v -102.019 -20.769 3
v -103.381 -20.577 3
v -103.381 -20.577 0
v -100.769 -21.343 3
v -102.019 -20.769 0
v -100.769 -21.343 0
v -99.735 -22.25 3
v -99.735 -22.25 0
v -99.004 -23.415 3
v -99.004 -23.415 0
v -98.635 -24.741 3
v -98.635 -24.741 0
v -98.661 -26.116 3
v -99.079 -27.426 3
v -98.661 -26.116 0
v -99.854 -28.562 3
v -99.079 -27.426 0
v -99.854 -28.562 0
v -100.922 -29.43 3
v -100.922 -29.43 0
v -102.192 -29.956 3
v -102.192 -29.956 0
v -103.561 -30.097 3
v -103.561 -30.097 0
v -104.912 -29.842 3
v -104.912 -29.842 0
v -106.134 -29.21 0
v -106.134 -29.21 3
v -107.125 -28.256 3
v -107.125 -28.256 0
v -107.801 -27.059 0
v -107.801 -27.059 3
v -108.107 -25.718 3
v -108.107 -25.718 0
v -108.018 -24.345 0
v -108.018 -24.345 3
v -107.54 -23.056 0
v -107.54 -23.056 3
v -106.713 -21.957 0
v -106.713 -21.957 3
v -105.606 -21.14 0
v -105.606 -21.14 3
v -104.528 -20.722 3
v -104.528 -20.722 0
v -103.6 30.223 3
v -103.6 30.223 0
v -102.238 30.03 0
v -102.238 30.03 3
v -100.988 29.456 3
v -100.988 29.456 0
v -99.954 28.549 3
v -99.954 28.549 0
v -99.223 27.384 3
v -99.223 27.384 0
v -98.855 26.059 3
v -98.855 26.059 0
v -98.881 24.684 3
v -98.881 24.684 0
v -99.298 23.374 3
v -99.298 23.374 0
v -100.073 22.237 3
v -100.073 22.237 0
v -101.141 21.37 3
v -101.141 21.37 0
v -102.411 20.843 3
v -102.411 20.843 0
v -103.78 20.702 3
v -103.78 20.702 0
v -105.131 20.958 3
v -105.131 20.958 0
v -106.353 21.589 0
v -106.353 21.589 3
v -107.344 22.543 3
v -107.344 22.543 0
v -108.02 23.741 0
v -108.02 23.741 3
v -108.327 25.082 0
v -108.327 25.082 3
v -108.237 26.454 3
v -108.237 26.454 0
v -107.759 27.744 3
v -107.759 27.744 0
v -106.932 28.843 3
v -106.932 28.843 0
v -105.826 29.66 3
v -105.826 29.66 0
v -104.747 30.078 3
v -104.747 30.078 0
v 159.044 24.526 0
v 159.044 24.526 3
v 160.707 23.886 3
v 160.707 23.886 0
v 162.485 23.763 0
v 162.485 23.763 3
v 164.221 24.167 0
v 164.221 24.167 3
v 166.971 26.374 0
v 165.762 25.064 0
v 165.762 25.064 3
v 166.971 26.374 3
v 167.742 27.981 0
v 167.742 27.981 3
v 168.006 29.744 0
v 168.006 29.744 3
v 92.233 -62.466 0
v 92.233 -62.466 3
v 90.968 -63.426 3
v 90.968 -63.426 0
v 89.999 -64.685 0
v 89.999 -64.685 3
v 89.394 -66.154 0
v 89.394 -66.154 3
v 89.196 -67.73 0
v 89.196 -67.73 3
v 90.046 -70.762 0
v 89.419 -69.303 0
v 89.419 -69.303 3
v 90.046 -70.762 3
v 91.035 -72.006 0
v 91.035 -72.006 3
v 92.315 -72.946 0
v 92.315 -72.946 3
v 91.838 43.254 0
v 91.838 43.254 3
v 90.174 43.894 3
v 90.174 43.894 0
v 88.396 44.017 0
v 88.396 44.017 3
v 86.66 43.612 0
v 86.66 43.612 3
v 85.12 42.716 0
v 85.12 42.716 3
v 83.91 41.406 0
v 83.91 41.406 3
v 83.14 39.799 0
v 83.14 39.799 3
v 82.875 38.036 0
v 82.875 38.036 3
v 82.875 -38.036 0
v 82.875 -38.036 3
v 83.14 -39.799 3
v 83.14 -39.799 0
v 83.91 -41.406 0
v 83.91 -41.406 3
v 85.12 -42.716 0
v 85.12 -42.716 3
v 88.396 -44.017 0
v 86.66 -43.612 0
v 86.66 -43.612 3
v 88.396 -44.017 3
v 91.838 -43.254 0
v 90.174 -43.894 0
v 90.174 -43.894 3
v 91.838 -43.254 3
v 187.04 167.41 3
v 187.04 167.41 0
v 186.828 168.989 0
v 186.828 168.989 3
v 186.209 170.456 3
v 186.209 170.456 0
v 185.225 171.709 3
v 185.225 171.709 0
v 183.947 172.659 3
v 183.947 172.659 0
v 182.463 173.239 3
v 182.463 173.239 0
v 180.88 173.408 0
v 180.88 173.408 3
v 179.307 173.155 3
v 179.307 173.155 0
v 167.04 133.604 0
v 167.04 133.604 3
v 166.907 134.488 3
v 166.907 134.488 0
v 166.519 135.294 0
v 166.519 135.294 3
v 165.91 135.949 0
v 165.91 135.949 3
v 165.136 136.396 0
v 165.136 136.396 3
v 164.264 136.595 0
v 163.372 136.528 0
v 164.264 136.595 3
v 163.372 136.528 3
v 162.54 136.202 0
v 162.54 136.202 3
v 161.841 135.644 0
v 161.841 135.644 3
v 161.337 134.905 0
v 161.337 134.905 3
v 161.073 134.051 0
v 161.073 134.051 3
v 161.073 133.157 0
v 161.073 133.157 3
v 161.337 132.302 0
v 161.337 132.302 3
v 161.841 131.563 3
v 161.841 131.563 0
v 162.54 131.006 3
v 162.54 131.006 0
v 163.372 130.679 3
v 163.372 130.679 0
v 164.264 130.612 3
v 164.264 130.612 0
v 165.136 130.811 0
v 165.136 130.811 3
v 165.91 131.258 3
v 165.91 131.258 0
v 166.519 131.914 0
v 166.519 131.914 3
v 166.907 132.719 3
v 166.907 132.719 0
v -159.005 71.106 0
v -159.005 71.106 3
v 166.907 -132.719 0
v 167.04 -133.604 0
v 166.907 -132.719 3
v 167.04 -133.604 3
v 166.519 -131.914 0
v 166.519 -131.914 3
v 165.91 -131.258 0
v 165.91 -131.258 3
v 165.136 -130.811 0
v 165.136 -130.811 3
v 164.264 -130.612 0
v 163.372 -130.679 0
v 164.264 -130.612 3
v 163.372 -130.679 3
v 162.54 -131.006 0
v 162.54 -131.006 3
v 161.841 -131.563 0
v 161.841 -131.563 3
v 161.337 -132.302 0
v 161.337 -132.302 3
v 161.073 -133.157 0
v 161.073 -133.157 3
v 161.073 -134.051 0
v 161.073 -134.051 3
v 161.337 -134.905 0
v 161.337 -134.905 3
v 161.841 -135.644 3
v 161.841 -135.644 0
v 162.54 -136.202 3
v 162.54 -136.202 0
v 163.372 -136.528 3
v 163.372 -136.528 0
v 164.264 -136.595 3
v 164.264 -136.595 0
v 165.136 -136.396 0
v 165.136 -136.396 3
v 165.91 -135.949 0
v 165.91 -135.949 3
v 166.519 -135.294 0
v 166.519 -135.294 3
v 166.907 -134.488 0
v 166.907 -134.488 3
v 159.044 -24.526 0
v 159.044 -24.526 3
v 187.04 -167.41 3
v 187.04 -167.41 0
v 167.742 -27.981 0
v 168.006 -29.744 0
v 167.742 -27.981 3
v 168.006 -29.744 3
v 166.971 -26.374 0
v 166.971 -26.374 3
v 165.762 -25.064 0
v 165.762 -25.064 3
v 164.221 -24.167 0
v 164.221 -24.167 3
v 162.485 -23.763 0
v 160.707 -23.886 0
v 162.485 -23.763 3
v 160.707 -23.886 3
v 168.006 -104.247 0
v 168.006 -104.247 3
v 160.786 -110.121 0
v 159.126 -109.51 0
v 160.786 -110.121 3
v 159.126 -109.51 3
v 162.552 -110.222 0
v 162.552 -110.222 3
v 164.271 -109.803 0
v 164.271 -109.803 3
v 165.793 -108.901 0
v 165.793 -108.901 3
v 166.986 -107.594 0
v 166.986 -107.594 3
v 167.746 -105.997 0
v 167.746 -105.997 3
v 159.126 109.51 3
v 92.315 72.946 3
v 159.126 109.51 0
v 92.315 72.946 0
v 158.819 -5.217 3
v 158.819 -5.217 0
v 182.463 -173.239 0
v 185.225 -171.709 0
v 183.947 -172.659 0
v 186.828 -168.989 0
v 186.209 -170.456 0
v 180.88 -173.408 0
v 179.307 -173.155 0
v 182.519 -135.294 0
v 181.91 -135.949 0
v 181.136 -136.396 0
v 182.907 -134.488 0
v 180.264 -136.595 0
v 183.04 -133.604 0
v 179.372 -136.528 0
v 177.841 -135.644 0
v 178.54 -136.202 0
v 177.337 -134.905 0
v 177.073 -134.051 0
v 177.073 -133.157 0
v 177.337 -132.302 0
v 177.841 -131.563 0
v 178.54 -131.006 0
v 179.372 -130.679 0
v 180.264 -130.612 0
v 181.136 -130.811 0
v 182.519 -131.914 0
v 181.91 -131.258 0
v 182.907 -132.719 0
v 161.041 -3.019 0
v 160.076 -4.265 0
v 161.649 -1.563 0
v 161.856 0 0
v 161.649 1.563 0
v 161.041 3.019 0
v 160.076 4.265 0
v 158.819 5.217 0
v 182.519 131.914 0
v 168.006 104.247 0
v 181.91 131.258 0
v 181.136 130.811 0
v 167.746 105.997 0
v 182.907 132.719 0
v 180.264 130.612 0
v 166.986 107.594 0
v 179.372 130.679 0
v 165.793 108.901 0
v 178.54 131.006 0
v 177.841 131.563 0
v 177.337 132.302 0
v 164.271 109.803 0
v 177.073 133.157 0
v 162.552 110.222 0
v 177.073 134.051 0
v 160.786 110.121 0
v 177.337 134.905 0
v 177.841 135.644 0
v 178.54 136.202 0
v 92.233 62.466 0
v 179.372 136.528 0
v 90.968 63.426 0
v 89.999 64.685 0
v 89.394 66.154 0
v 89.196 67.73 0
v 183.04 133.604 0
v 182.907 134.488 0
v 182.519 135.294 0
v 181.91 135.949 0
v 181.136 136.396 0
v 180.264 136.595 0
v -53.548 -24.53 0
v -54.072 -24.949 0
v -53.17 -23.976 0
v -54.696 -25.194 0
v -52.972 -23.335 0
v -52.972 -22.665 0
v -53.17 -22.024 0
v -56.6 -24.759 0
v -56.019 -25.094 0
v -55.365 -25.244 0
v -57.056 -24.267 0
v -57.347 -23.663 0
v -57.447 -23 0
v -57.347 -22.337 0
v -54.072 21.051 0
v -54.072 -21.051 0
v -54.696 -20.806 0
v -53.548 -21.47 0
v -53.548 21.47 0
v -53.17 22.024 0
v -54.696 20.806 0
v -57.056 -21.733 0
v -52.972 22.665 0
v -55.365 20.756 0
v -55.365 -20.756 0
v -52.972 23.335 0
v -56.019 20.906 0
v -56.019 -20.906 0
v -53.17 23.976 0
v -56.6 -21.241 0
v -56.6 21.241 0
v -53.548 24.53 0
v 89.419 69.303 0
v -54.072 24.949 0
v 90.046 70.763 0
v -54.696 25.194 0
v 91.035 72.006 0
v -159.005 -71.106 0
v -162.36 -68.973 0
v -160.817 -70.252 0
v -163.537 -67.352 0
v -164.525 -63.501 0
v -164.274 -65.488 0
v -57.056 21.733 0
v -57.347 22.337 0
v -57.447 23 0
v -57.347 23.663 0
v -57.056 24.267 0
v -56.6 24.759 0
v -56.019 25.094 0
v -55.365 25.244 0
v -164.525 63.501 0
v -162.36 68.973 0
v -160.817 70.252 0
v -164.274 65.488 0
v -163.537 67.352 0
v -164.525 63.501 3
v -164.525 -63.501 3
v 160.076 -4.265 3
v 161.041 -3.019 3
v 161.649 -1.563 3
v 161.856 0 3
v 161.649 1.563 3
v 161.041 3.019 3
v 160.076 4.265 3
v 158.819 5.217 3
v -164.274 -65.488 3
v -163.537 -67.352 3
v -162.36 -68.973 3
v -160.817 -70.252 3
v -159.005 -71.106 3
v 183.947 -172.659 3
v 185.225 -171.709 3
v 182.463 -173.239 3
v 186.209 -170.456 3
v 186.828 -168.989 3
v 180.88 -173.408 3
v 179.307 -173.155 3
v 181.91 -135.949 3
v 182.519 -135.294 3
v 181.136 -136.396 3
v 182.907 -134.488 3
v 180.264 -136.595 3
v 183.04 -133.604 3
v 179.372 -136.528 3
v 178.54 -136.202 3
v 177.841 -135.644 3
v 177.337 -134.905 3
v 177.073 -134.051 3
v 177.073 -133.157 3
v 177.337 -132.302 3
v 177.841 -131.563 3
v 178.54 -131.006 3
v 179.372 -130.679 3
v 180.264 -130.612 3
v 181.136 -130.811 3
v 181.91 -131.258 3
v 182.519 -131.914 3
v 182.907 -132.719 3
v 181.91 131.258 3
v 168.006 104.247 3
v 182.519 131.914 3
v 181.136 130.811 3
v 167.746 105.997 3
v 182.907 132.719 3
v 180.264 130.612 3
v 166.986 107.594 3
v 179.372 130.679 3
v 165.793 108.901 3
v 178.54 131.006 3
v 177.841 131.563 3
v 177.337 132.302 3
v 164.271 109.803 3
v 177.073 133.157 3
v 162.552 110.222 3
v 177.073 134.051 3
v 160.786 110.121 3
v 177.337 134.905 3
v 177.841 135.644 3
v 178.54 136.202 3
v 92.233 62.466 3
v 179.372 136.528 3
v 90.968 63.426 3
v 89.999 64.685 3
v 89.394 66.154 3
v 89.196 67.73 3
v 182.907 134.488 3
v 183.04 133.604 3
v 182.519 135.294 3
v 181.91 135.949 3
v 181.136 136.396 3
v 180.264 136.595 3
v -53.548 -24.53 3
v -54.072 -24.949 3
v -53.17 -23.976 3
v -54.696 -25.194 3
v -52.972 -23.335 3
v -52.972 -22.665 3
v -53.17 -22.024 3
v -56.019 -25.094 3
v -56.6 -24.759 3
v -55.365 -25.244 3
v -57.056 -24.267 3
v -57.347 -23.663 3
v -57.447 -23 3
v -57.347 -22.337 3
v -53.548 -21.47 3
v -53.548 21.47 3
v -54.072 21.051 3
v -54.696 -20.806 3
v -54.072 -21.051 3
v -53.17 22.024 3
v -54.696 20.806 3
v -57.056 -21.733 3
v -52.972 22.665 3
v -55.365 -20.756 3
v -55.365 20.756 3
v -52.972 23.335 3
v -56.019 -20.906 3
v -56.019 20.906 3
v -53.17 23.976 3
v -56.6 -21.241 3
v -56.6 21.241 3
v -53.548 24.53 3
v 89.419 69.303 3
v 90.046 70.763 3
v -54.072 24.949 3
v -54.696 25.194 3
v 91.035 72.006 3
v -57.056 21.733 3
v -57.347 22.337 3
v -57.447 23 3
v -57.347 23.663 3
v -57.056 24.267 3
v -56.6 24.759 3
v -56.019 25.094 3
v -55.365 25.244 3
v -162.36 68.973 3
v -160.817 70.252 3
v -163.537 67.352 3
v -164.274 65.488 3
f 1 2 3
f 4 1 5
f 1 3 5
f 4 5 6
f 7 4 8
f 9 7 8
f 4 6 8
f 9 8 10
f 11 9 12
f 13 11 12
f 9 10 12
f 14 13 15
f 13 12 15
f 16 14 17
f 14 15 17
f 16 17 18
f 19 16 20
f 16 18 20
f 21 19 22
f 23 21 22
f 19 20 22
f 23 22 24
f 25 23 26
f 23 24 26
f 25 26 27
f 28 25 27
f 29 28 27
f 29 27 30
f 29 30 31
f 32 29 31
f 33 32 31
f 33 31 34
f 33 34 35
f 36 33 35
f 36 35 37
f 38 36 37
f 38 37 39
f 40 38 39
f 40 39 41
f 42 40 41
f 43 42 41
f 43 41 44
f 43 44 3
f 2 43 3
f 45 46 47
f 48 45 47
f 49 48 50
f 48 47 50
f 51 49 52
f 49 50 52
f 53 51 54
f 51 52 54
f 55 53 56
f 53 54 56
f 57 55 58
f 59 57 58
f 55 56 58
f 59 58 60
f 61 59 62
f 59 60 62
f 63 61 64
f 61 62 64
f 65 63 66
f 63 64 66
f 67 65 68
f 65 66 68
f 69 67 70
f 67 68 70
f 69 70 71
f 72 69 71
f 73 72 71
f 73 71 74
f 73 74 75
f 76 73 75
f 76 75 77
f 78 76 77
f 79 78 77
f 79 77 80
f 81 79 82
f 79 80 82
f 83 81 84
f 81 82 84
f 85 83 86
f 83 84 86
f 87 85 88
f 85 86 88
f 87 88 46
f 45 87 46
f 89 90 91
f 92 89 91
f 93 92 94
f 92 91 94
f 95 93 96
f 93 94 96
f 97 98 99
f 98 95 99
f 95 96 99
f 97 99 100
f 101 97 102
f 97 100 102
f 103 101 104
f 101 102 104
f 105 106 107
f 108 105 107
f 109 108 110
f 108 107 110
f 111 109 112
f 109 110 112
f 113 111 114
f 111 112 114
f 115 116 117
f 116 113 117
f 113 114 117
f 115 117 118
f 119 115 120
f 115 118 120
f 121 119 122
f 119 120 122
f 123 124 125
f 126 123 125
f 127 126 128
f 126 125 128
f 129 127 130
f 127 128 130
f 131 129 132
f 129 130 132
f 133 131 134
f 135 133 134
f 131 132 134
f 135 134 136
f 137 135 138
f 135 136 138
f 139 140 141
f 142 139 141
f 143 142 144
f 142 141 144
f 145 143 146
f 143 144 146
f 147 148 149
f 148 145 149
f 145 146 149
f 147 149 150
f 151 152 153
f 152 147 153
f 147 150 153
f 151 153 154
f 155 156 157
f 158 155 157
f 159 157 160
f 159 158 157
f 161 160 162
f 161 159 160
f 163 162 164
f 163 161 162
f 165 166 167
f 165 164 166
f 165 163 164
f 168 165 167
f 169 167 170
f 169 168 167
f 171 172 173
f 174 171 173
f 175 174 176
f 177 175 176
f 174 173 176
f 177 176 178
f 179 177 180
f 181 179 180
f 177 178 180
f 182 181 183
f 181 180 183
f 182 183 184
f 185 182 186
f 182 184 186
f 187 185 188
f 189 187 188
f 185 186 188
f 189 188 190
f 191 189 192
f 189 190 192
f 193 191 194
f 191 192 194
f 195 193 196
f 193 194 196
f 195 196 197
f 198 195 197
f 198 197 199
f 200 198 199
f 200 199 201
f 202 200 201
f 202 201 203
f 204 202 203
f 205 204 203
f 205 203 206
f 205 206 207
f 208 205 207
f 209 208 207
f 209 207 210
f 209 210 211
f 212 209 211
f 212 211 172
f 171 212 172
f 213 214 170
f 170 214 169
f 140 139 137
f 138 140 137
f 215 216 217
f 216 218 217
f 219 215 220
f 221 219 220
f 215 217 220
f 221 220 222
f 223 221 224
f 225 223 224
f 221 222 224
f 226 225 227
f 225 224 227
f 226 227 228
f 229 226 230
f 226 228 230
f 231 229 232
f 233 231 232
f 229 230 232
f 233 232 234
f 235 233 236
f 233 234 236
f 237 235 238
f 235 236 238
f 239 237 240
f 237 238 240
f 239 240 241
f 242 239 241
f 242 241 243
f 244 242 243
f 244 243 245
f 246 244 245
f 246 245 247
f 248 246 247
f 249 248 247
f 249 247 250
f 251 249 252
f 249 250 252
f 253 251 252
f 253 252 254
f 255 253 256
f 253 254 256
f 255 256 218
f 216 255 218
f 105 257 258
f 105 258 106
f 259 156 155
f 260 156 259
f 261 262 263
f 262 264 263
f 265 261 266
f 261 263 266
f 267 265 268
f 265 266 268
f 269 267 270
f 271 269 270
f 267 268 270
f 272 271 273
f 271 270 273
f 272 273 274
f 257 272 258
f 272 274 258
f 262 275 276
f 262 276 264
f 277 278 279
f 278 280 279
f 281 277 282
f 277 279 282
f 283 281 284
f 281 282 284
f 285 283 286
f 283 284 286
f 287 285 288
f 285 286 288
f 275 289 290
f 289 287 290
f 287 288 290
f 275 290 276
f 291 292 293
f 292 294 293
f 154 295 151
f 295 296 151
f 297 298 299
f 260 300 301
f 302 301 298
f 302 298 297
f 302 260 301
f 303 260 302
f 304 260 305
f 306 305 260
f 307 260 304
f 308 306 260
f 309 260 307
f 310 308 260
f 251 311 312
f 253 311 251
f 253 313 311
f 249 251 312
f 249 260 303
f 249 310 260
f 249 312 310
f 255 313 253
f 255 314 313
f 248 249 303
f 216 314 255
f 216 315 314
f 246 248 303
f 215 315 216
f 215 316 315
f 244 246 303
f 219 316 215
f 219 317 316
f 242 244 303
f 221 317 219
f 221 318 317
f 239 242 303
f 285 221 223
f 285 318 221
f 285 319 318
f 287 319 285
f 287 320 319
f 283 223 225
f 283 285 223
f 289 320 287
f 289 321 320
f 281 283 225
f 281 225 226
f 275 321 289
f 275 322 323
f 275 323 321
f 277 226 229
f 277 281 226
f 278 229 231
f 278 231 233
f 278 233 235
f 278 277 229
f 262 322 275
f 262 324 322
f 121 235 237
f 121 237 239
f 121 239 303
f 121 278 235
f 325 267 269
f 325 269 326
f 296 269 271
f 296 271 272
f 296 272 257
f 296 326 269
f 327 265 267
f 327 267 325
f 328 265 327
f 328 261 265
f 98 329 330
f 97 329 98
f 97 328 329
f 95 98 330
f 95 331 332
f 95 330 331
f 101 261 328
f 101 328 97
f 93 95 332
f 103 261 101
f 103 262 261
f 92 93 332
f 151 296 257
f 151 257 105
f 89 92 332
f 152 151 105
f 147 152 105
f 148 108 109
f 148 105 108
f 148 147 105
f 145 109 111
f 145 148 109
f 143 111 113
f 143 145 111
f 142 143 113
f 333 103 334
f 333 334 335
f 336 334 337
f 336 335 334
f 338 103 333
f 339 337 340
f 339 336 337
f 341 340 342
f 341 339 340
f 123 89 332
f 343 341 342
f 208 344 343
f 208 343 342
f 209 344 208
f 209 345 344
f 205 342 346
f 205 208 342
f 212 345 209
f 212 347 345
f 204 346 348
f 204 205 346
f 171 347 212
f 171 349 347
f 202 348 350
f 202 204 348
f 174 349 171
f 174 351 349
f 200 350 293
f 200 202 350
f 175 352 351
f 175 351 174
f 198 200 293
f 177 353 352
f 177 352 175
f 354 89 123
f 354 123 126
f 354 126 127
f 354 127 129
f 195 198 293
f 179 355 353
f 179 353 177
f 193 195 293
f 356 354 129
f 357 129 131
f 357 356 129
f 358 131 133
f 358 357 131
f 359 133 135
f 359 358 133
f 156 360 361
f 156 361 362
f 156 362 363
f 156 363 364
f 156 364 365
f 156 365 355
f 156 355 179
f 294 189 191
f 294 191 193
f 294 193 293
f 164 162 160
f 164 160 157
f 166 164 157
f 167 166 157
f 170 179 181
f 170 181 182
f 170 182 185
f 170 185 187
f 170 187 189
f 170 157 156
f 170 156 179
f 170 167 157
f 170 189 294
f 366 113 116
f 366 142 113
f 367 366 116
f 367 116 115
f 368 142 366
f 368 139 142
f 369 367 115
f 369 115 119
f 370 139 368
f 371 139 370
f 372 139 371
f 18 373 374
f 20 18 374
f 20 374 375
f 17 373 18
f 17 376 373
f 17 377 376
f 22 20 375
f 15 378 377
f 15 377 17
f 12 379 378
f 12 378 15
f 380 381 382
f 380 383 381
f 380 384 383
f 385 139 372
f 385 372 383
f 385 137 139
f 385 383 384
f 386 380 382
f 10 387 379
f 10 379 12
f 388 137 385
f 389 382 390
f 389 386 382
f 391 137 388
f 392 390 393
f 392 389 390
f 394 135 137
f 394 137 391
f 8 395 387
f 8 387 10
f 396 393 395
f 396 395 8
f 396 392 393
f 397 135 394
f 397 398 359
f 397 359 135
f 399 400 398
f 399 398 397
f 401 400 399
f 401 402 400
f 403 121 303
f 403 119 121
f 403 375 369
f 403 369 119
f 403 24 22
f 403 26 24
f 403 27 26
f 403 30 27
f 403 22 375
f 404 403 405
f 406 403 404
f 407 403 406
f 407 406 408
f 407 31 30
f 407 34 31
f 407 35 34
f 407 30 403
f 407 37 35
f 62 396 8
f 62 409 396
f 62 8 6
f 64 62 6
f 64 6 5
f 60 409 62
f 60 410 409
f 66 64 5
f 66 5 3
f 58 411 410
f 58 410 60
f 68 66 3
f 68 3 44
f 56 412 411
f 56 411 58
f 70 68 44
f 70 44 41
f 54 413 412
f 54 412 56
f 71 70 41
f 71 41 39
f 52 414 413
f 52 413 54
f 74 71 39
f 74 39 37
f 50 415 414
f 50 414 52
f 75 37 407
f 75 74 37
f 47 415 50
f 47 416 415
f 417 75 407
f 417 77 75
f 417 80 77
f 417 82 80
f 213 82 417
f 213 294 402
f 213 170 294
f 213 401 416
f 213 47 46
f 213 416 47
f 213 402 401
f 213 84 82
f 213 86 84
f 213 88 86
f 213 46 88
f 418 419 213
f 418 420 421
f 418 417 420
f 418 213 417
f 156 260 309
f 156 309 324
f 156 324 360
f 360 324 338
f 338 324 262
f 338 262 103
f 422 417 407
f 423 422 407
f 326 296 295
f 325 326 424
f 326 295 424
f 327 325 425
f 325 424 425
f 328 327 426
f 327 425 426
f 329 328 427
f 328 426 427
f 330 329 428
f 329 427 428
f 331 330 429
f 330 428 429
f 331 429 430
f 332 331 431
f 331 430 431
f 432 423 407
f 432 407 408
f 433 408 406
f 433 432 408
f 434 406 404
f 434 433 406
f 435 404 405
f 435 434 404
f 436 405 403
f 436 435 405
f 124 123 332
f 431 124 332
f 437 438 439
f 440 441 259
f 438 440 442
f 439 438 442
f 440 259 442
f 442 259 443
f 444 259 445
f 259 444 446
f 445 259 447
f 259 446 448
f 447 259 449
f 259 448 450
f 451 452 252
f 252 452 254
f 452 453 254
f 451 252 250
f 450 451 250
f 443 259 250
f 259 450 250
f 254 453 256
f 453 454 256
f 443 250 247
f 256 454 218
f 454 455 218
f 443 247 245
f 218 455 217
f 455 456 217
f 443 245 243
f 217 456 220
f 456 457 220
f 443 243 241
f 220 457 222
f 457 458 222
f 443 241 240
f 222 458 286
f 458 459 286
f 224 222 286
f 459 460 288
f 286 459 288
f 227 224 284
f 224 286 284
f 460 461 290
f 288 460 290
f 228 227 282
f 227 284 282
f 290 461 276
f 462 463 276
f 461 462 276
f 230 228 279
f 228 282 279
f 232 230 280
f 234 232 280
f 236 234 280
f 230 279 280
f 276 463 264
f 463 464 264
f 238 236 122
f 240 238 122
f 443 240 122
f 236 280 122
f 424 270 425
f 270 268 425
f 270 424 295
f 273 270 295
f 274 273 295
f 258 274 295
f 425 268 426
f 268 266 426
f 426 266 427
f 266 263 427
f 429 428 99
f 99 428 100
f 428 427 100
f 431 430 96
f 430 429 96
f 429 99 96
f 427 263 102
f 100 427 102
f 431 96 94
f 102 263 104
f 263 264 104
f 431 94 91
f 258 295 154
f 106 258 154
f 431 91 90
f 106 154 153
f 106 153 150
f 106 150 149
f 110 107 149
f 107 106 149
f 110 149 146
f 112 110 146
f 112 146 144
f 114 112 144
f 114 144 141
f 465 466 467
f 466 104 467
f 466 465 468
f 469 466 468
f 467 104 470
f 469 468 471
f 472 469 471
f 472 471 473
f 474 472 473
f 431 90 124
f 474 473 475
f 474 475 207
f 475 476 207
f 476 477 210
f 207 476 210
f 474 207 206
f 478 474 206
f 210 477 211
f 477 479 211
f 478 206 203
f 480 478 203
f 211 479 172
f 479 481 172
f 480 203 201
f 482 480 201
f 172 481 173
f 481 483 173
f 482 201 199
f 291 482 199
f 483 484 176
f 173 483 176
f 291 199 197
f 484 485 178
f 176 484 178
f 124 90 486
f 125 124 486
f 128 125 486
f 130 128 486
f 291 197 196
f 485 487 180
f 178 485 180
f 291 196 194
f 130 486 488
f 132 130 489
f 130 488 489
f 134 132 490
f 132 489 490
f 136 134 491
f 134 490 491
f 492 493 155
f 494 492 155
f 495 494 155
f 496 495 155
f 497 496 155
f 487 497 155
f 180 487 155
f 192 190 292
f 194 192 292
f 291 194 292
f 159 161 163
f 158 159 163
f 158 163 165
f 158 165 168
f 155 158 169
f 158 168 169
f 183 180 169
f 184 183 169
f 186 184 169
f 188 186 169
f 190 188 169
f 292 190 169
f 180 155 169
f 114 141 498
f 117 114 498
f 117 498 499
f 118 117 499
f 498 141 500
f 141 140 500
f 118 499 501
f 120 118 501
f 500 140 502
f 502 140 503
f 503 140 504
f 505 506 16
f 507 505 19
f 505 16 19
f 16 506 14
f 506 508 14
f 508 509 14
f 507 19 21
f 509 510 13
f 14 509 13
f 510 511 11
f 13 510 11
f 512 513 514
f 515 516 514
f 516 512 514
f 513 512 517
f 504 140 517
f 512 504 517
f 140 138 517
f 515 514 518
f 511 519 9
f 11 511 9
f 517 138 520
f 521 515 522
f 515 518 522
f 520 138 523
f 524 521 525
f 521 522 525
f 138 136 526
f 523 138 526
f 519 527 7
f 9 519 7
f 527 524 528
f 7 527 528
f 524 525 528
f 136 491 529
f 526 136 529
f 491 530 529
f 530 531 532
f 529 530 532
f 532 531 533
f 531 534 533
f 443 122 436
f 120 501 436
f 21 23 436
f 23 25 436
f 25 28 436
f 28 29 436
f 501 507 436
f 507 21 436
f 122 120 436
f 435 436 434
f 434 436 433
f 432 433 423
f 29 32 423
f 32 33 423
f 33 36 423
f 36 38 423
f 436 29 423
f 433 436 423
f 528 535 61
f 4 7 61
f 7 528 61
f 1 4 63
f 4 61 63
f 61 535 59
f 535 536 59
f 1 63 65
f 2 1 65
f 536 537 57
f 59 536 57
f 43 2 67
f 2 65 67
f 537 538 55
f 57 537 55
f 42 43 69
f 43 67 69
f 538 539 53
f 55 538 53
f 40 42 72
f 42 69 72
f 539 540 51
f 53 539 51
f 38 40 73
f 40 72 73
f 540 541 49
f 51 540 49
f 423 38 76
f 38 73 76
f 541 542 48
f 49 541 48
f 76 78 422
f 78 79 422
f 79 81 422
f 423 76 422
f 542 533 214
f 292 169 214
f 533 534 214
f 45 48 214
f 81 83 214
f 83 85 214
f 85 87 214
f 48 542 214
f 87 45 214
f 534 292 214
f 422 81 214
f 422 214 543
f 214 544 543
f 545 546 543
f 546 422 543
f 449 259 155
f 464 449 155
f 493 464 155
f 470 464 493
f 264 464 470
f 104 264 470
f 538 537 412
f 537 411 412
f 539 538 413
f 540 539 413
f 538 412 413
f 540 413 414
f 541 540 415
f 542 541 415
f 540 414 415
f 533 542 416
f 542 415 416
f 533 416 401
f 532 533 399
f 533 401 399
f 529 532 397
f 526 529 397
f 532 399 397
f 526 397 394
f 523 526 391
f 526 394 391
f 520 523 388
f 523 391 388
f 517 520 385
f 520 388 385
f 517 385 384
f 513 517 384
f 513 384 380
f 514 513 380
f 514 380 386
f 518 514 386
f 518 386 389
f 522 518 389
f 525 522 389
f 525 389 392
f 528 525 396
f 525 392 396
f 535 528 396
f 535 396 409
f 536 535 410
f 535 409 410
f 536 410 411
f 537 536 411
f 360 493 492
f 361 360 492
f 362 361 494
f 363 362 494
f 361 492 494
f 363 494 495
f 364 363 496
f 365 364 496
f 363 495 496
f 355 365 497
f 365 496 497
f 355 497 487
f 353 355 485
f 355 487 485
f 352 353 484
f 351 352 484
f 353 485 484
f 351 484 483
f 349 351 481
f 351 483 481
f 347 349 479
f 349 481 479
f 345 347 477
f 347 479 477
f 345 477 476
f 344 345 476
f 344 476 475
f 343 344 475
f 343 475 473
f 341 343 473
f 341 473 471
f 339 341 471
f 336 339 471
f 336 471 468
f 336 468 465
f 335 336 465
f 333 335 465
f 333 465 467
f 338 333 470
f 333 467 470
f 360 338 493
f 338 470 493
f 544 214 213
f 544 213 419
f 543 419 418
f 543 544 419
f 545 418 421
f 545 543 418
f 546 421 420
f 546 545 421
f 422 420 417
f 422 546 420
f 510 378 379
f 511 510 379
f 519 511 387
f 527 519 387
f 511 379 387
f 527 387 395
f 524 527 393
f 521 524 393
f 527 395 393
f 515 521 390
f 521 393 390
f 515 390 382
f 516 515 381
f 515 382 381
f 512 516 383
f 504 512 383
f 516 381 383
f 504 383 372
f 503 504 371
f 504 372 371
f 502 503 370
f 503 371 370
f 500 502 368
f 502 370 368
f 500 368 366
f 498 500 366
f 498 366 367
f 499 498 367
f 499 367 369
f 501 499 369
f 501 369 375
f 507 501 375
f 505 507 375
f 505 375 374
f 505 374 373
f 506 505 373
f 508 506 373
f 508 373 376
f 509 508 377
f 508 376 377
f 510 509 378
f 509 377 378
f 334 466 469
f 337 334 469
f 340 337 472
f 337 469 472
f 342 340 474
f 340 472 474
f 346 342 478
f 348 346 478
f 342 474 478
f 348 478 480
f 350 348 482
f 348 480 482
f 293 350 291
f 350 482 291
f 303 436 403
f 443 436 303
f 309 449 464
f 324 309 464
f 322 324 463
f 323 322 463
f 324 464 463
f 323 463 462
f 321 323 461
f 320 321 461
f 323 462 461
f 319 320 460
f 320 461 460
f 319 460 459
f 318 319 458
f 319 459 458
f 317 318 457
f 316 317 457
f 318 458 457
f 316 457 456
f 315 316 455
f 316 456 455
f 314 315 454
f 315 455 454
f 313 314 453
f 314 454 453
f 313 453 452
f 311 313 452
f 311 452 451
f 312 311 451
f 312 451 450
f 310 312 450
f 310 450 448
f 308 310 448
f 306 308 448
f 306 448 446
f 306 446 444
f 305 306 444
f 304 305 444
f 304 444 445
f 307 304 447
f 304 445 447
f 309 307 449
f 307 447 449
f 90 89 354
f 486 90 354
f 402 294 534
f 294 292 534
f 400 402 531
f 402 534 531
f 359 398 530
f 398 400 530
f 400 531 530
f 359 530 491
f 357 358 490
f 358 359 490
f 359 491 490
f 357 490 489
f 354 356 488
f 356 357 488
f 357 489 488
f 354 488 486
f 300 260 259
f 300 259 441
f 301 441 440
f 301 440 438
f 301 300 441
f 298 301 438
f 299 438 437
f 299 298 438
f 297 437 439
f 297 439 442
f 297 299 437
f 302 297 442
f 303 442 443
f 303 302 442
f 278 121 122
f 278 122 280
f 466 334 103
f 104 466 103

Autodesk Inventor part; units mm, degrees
ref_plane "YZ Plane" through (0, 0, 0) normal (1, 0, 0) x (0, 1, 0)
ref_plane "XZ Plane" through (0, 0, 0) normal (0, 1, 0) x (-1, 0, 0)
sketch "Base" plane through (0, 0, 0) normal (0, 0, 1) x (1, 0, 0)
  line L0 (-173.8499, -66.2658) -> (171.6188, -178.9186) construction
  line L1 (-9.525, -101.5493) -> (-9.525, 101.5493) construction
  line L2 (-9.525, 0) -> (-9.525, -119.85)
  line L3 (187.0398, -183.9472) -> (-9.525, -119.85)
  line L4 (187.0398, -183.9472) -> (187.0398, 0)
  line L5 (187.0398, 0) -> (-9.525, 0) construction
  line L6 (-9.525, 0) -> (-9.525, 119.85)
  line L7 (187.0398, 183.9472) -> (-9.525, 119.85)
  line L8 (187.0398, 183.9472) -> (187.0398, 0)
  point P0 (0, 0)
  point P1 (187.0398, -182.4643)
extrude "Plate1" add sketch "Base" along normal blind 3
sketch "MountHoles" plane through (0, 0, 0) normal (0, 0, -1) x (-1, 0, 0)
  line L0 (-179.0398, 172.9239) -> (1.525, 114.0441) construction
  circle A0 centre (-179.0398, 172.9239) radius 3
  circle A1 centre (1.525, 114.0441) radius 3
  line L1 (-226.3528, 0) -> (48.838, 0) construction
  circle A2 centre (-179.0398, -172.9239) radius 3
  circle A3 centre (1.525, -114.0441) radius 3
  line L2 (-187.0398, 183.9472) -> (9.525, 119.85) projected
  point P0 (0, 0)
  dimension "d2" = 6
  dimension "d3" = 6
  dimension "d45" = 8
extrude "MountHolesFeature" cut sketch "MountHoles" against normal blind 3
sketch "TorsoLiftMountHoles" plane through (0, 0, 3) normal (0, 0, 1) x (1, 0, 0)
  circle A0 centre (180.0398, -133.6037) radius 3 projected
  circle A1 centre (164.0398, -133.6037) radius 3 projected
  circle A2 centre (180.0398, 133.6037) radius 3 projected
  circle A3 centre (164.0398, 133.6037) radius 3 projected
  point P0 (0, 0)
extrude "TorsoLiftMountHolesFeature" cut sketch "TorsoLiftMountHoles" against normal blind 3
sketch "Continuation" plane through (0, 0, 0) normal (0, 0, -1) x (-1, 0, 0)
  line L0 (9.525, 119.85) -> (164.525, 69.3065)
  line L1 (-257.3528, 0) -> (234.838, 0) construction
  line L2 (9.525, -119.85) -> (164.525, -69.3065)
  line L3 (164.525, 69.3065) -> (164.525, -69.3065)
  line L4 (-187.0398, 183.9472) -> (9.525, 119.85)
  line L5 (9.525, 119.85) -> (9.525, -119.85)
  circle A0 centre (1.525, 114.0441) radius 3
  line L6 (1.525, 114.0441) -> (164.525, 60.8919) construction
  circle A1 centre (139.525, 69.0441) radius 3
  circle A2 centre (139.525, -69.0441) radius 3
  point P0 (0, 0)
  dimension "d46" = 155
  dimension "d47" = 25
sheet face with bend "ContinuationFeature" sketch "Continuation" thickness 3 toward (0, 0, 1) bend radius 3 contours L0 L3 L2 L5
bend "Bend2"
fillet "OutsideFilletsFeature" radius 8 4 edges at (187.0398, -183.9472, 1.5) (187.0398, 183.9472, 1.5) (-164.525, 69.3065, 1.5) (-164.525, -69.3065, 1.5)
ref_plane "MidPlane" through (0, -71.2585, 3.048) normal (1, 0, 0) x (0, 0, -1)
sketch "BottomMountHoles" plane through (0, 0, 0) normal (0, 0, -1) x (-1, 0, 0)
  circle A0 centre (18.4607, -50.75) radius 2.75 projected
  circle A1 centre (18.4607, -8.25) radius 2.75 projected
  circle A2 centre (18.4607, 8.25) radius 2.75 projected
  circle A3 centre (18.4607, 50.75) radius 2.75 projected
  ellipse E0 centre (103.3601, -25.3391) end of major axis (108.1225, -25.3596) minor radius 4.7625 projected
  ellipse E1 centre (103.5793, 25.4605) end of major axis (108.3417, 25.4399) minor radius 4.7625 projected
  spline S0 degree 3 poles (-22.2189, -83.25) (-22.5891, -83.25) (-22.9886, -83.178) (-23.6929, -82.9105) (-24.0824, -82.71) (-24.7238, -82.1045) (-24.9548, -81.7839) (-25.3958, -80.8943) (-25.4483, -80.428) (-25.4764, -79.9859) (-25.4838, -79.5156) (-25.1415, -78.5243) (-24.922, -78.15) (-24.3999, -77.5609) (-24.0923, -77.3244) (-23.5146, -77.014) (-23.2534, -76.9113) (-22.8383, -76.8067) (-22.5689, -76.75) (-22.2189, -76.75) knots 0 0 0 0 0.111053 0.111053 0.202489 0.202489 0.273701 0.273701 0.38581 0.38581 0.497395 0.497395 0.578796 0.578796 0.654724 0.654724 0.709985 0.709985 0.740525 0.740525 0.740525 0.740525 construction
  arc A4 (-22.2189, 83.25) -> (-22.2189, 76.75) centre (-22.2189, 80) ccw construction
  arc A5 (-133.7189, -83.25) -> (-133.7189, -76.75) centre (-133.7189, -80) ccw construction
  spline S1 degree 3 poles (-133.7189, 83.25) (-133.3487, 83.25) (-132.9492, 83.178) (-132.2449, 82.9105) (-131.8554, 82.71) (-131.2141, 82.1045) (-130.983, 81.7839) (-130.542, 80.8943) (-130.4896, 80.428) (-130.4615, 79.9859) (-130.4541, 79.5156) (-130.7963, 78.5243) (-131.0158, 78.15) (-131.538, 77.5609) (-131.8456, 77.3244) (-132.4232, 77.014) (-132.6845, 76.9113) (-133.0996, 76.8067) (-133.3689, 76.75) (-133.7189, 76.75) knots 0 0 0 0 0.111053 0.111053 0.202489 0.202489 0.273701 0.273701 0.38581 0.38581 0.497395 0.497395 0.578796 0.578796 0.654725 0.654725 0.709986 0.709986 0.740527 0.740527 0.740527 0.740527 construction
  line L0 (167.4427, 0) -> (-246.1203, 0) construction
  point P0 (0, 0)
extrude "Cut8" cut sketch "BottomMountHoles" against normal blind 3 contours E0 | E1
delete faces "Delete1" heal yes whole lump no faces at (-139.4042, 72.0417, 2) (-4.5153, 113.8027, 2) (179.1606, 175.9215, 2) (179.1606, -169.9264, 2) (-4.5153, -114.2855, 2) (-139.4042, -66.0465, 2)
sketch "Sketch15" plane through (187.0398, -172.9239, 3) normal (0, 0, 1) x (1, 0, 0)
  line L0 (-346.045, 244.0304) -> (-10.4802, 353.4537) projected
  line L1 (-346.045, 244.0304) -> (-0.3836, 348.2954)
  line L2 (-423.7471, 172.9239) -> (72.8866, 172.9239) construction
  line L3 (0, 345.8479) -> (0, 0) projected
  arc A0 (0, 345.8479) -> (-10.4802, 353.4537) centre (-8, 345.8479) ccw projected
  arc A1 (-346.045, 244.0304) -> (-351.5648, 236.4246) centre (-343.5648, 236.4246) ccw projected
  line L4 (-351.5648, 109.4233) -> (-351.5648, 236.4246) projected
  line L5 (-346.045, 101.8175) -> (-0.3836, -2.4475)
  arc A2 (-10.4802, -7.6058) -> (0, 0) centre (-8, 0) ccw projected
  line L6 (-10.4802, -7.6058) -> (-346.045, 101.8175) projected
  arc A3 (-351.5648, 109.4233) -> (-346.045, 101.8175) centre (-343.5648, 109.4233) ccw projected
  point P0 (-187.0398, 172.9239)
  dimension "d84" = 178.725
extrude "AdjustToProductionFeature" cut sketch "Sketch15" against normal blind 3 contours L0 A0 L1 | L5 A2 L6
delete faces "Delete2" heal yes whole lump no faces at (187.0208, 173.4763, 1) (187.0208, -173.4763, 2)
fillet "Fillet5" radius 6 2 edges at (187.0398, 175.4872, 1.5) (187.0398, -175.4872, 1.5)
sketch "ContactorMount" plane through (-164.525, -63.5006, 0) normal (0, 0, -1) x (-1, 0, 0)
  circle A0 centre (-109.3281, 40.5006) radius 2.25 projected
  circle A1 centre (-109.3281, 86.5006) radius 2.25 projected
  point P0 (-164.525, 63.5006)
extrude "Cut12" cut sketch "ContactorMount" against normal blind 3
sketch "Sketch19" plane through (-164.525, -63.5006, 0) normal (0, 0, -1) x (-1, 0, 0)
  line L0 (-332.5315, 63.5006) -> (-247.3998, 15.1574)
  line L1 (-247.3998, 15.1574) -> (-247.3998, 111.8439)
  line L2 (-247.3998, 111.8439) -> (-332.5315, 63.5006)
  line L3 (-332.5315, 82.9372) -> (-247.3998, 131.2805)
  line L4 (-247.3998, 131.2805) -> (-332.5315, 177.8709)
  line L5 (-332.5315, 177.8709) -> (-332.5315, 82.9372)
  line L6 (-351.5648, -103.9097) -> (-351.5648, 230.9109) projected
  line L7 (-351.5648, 63.5006) -> (0, 63.5006) construction
  line L8 (0, 0) -> (0, 127.0012) projected
  line L9 (-332.5315, 63.5006) -> (-332.5315, 82.9372) construction
  line L10 (-247.3998, 111.8439) -> (-247.3998, 131.2805) construction
  line L11 (-332.5315, 44.064) -> (-247.3998, -4.2792)
  line L12 (-247.3998, -4.2792) -> (-332.5315, -50.8696)
  line L13 (-332.5315, -50.8696) -> (-332.5315, 44.064)
  point P0 (-164.525, 63.5006)
  point P1 (-247.3998, 63.5006)
extrude "Cut13" cut sketch "Sketch19" against normal blind 3
fillet "Fillet8" radius 6 9 edges at (168.0065, -19.4366, 1.5) (168.0065, -114.3703, 1.5) (82.8748, -67.7798, 1.5) (82.8748, -48.3432, 1.5) (168.0065, 0, 1.5) (82.8748, 48.3432, 1.5) (168.0065, 19.4366, 1.5) (82.8748, 67.7798, 1.5) (168.0065, 114.3703, 1.5)
equation "\"d7\" = Thickness"
equation "\"d43\" = Thickness"
equation "\"d82\" = Thickness"
equation "\"d85\" = Thickness"
equation "\"d0\" = Thickness"
equation "\"d48\" = BendRadius"
equation "\"d49\" = BendReliefWidth"
equation "\"d51\" = MinimumRemnant"
equation "\"d50\" = BendReliefDepth"
equation "\"d52\" = TransitionRadius"
equation "\"BendRadius\" = Thickness"
equation "\"BendReliefWidth\" = Thickness"
equation "\"BendReliefDepth\" = 0.5 * Thickness"
equation "\"CornerReliefSize\" = 4 * Thickness"
equation "\"MinimumRemnant\" = 2 * Thickness"
equation "\"TransitionRadius\" = BendRadius"
equation "\"JacobiRadiusSize\" = BendRadius"
equation "\"GapSize\" = Thickness"
equation "\"Thickness\" = 3"
